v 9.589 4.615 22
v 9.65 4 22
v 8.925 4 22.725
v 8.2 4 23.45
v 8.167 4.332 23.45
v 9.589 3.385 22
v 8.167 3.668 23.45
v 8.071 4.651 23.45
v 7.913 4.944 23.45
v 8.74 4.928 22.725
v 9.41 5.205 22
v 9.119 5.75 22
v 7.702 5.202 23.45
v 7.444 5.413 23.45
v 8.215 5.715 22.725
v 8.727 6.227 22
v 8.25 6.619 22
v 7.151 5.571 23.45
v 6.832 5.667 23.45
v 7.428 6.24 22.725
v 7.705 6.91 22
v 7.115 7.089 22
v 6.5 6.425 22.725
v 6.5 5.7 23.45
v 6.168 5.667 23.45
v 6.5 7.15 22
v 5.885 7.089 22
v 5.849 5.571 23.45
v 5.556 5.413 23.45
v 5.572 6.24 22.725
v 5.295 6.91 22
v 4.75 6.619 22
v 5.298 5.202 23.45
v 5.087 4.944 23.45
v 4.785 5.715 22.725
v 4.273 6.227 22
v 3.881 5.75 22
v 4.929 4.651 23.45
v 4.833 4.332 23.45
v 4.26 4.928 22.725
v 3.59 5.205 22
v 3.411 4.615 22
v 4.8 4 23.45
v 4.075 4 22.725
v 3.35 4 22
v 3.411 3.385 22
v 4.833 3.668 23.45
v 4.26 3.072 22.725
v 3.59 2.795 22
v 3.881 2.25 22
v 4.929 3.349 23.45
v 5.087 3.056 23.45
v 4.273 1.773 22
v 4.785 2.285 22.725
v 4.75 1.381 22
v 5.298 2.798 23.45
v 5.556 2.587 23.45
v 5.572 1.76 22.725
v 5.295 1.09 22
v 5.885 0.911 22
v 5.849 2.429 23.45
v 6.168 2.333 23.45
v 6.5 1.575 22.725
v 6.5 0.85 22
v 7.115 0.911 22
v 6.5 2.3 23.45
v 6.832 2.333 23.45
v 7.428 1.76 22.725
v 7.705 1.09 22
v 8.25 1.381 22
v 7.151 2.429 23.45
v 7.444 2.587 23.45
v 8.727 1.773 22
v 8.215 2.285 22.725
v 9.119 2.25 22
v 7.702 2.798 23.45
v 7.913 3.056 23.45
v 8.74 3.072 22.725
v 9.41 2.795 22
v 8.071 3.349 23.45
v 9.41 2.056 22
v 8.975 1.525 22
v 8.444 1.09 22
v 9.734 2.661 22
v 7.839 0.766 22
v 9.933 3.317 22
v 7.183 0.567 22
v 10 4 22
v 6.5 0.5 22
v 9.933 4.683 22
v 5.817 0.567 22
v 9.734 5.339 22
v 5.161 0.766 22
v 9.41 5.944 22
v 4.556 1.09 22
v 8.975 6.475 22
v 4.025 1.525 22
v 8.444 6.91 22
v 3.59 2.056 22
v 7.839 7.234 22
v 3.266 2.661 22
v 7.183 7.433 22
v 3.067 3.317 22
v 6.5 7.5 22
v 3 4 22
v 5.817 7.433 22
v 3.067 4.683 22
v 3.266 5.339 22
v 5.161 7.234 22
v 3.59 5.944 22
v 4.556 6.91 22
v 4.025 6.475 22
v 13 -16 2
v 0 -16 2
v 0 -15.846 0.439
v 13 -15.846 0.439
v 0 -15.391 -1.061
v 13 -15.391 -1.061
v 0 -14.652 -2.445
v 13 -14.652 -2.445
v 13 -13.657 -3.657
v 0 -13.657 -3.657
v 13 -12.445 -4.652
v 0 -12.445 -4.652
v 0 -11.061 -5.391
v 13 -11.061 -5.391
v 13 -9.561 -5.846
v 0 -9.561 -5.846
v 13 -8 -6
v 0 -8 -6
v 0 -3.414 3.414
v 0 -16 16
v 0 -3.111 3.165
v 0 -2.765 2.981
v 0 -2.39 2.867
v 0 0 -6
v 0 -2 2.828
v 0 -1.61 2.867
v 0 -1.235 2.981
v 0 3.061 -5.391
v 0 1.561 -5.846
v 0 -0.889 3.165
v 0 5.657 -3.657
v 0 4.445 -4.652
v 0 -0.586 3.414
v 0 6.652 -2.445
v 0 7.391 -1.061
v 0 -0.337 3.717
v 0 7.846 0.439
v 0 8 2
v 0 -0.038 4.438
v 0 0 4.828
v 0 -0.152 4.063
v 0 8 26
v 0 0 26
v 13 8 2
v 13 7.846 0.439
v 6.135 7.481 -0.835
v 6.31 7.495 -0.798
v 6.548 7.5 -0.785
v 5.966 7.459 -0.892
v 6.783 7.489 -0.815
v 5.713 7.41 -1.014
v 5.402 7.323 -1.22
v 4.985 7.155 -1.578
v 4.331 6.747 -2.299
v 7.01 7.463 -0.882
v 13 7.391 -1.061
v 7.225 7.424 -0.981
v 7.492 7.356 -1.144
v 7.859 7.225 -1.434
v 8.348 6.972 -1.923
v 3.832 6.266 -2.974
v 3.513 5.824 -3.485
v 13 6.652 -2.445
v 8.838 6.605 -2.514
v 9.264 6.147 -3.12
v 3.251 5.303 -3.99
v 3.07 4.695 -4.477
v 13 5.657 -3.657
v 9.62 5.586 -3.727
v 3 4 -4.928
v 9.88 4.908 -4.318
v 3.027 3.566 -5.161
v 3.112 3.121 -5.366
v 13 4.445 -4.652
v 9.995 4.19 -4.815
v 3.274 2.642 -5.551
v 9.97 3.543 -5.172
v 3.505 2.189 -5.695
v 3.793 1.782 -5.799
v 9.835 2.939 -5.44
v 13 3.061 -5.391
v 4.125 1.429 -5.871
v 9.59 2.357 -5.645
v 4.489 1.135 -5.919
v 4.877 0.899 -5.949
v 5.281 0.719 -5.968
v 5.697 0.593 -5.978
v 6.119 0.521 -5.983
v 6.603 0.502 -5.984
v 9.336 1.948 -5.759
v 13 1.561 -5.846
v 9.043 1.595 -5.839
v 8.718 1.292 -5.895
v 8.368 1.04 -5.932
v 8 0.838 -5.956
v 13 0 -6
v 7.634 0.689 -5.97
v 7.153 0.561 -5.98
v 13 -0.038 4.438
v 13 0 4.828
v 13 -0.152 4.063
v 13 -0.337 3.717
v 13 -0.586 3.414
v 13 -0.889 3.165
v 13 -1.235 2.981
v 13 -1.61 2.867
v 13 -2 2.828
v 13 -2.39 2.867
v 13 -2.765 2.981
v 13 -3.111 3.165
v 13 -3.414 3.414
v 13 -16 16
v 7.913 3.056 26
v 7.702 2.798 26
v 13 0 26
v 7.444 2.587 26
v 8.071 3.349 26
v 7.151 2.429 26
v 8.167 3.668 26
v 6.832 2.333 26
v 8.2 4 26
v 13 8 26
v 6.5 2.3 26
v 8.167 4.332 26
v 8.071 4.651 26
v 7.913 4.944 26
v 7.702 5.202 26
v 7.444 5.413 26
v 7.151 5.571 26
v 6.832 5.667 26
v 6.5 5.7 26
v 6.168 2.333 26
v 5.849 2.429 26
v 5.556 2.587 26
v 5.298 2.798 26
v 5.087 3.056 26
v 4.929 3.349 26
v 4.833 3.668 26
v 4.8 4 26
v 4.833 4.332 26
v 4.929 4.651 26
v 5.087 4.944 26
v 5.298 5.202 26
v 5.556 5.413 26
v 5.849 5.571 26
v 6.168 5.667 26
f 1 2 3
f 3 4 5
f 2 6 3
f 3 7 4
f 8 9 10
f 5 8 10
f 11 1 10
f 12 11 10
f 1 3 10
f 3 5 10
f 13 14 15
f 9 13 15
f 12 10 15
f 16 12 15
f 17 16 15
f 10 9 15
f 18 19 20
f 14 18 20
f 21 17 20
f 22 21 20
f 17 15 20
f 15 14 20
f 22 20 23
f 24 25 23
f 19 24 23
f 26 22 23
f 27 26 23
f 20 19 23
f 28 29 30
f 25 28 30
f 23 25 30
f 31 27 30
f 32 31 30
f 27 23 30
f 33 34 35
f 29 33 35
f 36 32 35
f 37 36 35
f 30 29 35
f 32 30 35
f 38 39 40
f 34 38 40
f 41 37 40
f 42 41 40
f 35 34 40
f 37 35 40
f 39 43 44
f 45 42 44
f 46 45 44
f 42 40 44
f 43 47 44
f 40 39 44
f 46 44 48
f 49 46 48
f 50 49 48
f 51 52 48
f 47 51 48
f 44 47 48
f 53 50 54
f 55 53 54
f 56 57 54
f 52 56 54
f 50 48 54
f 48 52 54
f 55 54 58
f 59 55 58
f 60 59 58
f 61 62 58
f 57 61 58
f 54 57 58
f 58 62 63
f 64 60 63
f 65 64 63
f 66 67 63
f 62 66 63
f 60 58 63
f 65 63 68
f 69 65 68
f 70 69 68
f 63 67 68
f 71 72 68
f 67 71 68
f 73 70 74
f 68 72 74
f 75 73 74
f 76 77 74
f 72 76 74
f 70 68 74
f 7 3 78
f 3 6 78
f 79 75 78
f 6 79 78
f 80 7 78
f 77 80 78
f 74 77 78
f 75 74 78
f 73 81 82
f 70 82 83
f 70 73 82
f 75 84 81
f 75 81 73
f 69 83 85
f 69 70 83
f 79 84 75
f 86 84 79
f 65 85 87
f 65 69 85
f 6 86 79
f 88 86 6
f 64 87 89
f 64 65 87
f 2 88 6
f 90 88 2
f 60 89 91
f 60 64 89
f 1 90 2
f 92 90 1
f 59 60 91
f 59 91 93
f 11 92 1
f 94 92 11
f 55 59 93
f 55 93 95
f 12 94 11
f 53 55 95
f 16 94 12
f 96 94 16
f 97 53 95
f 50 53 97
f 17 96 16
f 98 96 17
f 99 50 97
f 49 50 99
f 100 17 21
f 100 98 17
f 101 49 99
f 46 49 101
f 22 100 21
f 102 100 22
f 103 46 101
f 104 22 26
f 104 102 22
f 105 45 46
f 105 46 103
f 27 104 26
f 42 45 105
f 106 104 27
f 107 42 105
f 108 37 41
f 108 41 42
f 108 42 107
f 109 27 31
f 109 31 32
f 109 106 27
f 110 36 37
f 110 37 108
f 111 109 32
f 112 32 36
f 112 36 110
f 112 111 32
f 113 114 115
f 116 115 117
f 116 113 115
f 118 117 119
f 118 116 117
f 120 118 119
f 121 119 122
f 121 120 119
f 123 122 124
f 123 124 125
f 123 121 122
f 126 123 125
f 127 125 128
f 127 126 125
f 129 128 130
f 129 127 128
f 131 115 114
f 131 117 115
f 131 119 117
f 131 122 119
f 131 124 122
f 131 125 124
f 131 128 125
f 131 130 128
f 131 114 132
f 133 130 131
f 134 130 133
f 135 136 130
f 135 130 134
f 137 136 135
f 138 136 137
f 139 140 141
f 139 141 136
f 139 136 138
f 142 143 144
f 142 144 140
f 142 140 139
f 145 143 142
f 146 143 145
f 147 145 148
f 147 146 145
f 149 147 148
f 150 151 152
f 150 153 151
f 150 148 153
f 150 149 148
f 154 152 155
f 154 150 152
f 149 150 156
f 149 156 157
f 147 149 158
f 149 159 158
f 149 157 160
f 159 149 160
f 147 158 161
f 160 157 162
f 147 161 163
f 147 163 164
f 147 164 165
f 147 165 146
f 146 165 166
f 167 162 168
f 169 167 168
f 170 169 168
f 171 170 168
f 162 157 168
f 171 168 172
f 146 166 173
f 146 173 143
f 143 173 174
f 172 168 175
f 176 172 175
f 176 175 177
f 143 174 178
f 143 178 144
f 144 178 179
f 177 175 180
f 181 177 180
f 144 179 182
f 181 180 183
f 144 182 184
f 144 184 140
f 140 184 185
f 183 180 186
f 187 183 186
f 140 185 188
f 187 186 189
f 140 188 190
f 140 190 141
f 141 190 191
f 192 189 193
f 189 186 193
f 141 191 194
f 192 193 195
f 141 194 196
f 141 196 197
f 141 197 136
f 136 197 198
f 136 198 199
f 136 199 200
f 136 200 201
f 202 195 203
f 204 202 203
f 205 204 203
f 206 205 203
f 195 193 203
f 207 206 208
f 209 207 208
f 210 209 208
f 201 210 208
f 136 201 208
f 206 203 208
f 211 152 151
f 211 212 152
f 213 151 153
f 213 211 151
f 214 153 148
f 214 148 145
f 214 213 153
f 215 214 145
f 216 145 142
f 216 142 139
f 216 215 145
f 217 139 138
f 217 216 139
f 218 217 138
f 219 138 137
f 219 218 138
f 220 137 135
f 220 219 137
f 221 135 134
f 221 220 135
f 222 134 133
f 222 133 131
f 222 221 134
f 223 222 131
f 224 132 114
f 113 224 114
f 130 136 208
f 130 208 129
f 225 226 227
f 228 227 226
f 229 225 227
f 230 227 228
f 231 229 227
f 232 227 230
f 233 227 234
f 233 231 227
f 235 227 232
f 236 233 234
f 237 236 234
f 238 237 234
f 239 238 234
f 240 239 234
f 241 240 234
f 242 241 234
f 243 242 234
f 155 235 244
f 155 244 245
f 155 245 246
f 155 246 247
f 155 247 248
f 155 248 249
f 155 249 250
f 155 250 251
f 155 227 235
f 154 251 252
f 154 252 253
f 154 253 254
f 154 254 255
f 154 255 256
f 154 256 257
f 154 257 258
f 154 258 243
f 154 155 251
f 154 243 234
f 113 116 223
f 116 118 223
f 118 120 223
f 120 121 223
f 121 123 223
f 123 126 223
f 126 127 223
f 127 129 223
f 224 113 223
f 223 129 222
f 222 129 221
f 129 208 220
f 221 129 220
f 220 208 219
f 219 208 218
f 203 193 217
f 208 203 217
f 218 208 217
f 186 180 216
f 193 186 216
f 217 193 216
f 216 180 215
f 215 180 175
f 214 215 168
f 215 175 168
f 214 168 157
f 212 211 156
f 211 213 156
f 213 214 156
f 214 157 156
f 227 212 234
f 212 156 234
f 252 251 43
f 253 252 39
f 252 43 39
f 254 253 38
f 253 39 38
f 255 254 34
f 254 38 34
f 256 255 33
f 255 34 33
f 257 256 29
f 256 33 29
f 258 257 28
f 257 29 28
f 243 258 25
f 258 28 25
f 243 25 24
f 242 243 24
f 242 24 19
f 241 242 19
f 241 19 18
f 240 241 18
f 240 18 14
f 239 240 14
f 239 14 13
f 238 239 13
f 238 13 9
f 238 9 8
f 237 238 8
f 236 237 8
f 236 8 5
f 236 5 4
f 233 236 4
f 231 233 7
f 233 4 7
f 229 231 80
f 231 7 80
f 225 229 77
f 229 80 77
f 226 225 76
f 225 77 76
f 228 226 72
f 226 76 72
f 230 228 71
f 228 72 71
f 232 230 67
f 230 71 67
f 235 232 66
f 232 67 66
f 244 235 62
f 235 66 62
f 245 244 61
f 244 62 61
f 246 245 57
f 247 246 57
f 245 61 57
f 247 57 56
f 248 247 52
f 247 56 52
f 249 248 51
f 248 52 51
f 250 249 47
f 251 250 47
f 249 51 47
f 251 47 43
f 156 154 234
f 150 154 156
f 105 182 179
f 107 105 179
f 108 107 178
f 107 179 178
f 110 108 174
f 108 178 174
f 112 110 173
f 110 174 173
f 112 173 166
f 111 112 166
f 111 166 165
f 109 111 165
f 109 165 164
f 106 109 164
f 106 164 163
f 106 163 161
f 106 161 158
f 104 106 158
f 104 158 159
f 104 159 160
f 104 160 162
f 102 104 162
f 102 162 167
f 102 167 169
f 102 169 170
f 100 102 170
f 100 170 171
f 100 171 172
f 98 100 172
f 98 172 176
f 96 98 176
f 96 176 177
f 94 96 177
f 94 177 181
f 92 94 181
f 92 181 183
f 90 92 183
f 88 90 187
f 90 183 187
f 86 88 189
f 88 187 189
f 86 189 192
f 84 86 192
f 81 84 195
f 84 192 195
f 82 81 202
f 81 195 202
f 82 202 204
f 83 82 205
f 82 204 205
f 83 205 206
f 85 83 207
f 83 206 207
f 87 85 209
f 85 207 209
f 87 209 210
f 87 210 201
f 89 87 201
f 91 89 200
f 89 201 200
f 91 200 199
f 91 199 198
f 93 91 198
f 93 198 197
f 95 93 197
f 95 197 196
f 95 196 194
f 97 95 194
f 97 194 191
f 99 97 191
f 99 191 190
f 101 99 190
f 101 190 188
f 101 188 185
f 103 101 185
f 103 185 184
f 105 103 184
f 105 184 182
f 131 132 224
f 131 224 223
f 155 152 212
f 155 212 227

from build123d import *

# Parameters (mm, degrees)
BOSS_EXTRUDE1_DEPTH                                 = 13
FILLET2_R                                           = 8
SKETCH2_R                                           = 1.7
CUT_EXTRUDE1_DEPTH                                  = 41
SKETCH3_R                                           = 3.5
CUT_EXTRUDE2_DEPTH                                  = 28
CSK_FOR_M3_COUNTERSUNK_FLAT_HEAD_SCREW1_D           = 3.2
CSK_FOR_M3_COUNTERSUNK_FLAT_HEAD_SCREW1_CSINK_D     = 6.3
CSK_FOR_M3_COUNTERSUNK_FLAT_HEAD_SCREW1_CSINK_ANGLE = 90
FILLET3_R                                           = 2


with BuildPart() as part:
    # Sketch1 → Boss-Extrude1 (new body)
    with BuildSketch(Plane(origin=(0, 0, 0), x_dir=(0, 0, -1), z_dir=(1, 0, 0))):
        Polygon((0, -16), (-16, -16), (0, 0), (-26, 0), (-26, 8), (6, 8), (6, -16), align=None)
    extrude(amount=BOSS_EXTRUDE1_DEPTH)

    # Fillet2
    fillet2_edges = [part.edges().sort_by_distance(p)[0] for p in [
        (6.5, 8, -6),
        (6.5, -16, -6),
    ]]
    fillet(fillet2_edges, radius=FILLET2_R)

    # Sketch2 → Cut-Extrude1 (cut)
    with BuildSketch(Plane(origin=(0, 0, -6), x_dir=(-1, 0, 0), z_dir=(0, 0, -1))):
        with Locations((-6.5, 4)):
            Circle(SKETCH2_R)
    extrude(amount=-CUT_EXTRUDE1_DEPTH, mode=Mode.SUBTRACT)

    # Sketch3 → Cut-Extrude2 (cut)
    with BuildSketch(Plane(origin=(0, 0, -6), x_dir=(-1, 0, 0), z_dir=(0, 0, -1))):
        with Locations((-6.5, 4)):
            Circle(SKETCH3_R)
    extrude(amount=-CUT_EXTRUDE2_DEPTH, mode=Mode.SUBTRACT)

    # CSK for M3 Countersunk Flat Head Screw1 (through all)
    with Locations(Plane(origin=(0, 0, 22), x_dir=(-1, 0, 0), z_dir=(0, 0, -1))):
        with Locations((-6.5, 4)):
            CounterSinkHole(CSK_FOR_M3_COUNTERSUNK_FLAT_HEAD_SCREW1_D / 2, CSK_FOR_M3_COUNTERSUNK_FLAT_HEAD_SCREW1_CSINK_D / 2, counter_sink_angle=CSK_FOR_M3_COUNTERSUNK_FLAT_HEAD_SCREW1_CSINK_ANGLE)

    # Fillet3
    fillet3_edges = [part.edges().sort_by_distance(p)[0] for p in [
        (6.5, 0, 0),
    ]]
    fillet(fillet3_edges, radius=FILLET3_R)


solid = part.part
